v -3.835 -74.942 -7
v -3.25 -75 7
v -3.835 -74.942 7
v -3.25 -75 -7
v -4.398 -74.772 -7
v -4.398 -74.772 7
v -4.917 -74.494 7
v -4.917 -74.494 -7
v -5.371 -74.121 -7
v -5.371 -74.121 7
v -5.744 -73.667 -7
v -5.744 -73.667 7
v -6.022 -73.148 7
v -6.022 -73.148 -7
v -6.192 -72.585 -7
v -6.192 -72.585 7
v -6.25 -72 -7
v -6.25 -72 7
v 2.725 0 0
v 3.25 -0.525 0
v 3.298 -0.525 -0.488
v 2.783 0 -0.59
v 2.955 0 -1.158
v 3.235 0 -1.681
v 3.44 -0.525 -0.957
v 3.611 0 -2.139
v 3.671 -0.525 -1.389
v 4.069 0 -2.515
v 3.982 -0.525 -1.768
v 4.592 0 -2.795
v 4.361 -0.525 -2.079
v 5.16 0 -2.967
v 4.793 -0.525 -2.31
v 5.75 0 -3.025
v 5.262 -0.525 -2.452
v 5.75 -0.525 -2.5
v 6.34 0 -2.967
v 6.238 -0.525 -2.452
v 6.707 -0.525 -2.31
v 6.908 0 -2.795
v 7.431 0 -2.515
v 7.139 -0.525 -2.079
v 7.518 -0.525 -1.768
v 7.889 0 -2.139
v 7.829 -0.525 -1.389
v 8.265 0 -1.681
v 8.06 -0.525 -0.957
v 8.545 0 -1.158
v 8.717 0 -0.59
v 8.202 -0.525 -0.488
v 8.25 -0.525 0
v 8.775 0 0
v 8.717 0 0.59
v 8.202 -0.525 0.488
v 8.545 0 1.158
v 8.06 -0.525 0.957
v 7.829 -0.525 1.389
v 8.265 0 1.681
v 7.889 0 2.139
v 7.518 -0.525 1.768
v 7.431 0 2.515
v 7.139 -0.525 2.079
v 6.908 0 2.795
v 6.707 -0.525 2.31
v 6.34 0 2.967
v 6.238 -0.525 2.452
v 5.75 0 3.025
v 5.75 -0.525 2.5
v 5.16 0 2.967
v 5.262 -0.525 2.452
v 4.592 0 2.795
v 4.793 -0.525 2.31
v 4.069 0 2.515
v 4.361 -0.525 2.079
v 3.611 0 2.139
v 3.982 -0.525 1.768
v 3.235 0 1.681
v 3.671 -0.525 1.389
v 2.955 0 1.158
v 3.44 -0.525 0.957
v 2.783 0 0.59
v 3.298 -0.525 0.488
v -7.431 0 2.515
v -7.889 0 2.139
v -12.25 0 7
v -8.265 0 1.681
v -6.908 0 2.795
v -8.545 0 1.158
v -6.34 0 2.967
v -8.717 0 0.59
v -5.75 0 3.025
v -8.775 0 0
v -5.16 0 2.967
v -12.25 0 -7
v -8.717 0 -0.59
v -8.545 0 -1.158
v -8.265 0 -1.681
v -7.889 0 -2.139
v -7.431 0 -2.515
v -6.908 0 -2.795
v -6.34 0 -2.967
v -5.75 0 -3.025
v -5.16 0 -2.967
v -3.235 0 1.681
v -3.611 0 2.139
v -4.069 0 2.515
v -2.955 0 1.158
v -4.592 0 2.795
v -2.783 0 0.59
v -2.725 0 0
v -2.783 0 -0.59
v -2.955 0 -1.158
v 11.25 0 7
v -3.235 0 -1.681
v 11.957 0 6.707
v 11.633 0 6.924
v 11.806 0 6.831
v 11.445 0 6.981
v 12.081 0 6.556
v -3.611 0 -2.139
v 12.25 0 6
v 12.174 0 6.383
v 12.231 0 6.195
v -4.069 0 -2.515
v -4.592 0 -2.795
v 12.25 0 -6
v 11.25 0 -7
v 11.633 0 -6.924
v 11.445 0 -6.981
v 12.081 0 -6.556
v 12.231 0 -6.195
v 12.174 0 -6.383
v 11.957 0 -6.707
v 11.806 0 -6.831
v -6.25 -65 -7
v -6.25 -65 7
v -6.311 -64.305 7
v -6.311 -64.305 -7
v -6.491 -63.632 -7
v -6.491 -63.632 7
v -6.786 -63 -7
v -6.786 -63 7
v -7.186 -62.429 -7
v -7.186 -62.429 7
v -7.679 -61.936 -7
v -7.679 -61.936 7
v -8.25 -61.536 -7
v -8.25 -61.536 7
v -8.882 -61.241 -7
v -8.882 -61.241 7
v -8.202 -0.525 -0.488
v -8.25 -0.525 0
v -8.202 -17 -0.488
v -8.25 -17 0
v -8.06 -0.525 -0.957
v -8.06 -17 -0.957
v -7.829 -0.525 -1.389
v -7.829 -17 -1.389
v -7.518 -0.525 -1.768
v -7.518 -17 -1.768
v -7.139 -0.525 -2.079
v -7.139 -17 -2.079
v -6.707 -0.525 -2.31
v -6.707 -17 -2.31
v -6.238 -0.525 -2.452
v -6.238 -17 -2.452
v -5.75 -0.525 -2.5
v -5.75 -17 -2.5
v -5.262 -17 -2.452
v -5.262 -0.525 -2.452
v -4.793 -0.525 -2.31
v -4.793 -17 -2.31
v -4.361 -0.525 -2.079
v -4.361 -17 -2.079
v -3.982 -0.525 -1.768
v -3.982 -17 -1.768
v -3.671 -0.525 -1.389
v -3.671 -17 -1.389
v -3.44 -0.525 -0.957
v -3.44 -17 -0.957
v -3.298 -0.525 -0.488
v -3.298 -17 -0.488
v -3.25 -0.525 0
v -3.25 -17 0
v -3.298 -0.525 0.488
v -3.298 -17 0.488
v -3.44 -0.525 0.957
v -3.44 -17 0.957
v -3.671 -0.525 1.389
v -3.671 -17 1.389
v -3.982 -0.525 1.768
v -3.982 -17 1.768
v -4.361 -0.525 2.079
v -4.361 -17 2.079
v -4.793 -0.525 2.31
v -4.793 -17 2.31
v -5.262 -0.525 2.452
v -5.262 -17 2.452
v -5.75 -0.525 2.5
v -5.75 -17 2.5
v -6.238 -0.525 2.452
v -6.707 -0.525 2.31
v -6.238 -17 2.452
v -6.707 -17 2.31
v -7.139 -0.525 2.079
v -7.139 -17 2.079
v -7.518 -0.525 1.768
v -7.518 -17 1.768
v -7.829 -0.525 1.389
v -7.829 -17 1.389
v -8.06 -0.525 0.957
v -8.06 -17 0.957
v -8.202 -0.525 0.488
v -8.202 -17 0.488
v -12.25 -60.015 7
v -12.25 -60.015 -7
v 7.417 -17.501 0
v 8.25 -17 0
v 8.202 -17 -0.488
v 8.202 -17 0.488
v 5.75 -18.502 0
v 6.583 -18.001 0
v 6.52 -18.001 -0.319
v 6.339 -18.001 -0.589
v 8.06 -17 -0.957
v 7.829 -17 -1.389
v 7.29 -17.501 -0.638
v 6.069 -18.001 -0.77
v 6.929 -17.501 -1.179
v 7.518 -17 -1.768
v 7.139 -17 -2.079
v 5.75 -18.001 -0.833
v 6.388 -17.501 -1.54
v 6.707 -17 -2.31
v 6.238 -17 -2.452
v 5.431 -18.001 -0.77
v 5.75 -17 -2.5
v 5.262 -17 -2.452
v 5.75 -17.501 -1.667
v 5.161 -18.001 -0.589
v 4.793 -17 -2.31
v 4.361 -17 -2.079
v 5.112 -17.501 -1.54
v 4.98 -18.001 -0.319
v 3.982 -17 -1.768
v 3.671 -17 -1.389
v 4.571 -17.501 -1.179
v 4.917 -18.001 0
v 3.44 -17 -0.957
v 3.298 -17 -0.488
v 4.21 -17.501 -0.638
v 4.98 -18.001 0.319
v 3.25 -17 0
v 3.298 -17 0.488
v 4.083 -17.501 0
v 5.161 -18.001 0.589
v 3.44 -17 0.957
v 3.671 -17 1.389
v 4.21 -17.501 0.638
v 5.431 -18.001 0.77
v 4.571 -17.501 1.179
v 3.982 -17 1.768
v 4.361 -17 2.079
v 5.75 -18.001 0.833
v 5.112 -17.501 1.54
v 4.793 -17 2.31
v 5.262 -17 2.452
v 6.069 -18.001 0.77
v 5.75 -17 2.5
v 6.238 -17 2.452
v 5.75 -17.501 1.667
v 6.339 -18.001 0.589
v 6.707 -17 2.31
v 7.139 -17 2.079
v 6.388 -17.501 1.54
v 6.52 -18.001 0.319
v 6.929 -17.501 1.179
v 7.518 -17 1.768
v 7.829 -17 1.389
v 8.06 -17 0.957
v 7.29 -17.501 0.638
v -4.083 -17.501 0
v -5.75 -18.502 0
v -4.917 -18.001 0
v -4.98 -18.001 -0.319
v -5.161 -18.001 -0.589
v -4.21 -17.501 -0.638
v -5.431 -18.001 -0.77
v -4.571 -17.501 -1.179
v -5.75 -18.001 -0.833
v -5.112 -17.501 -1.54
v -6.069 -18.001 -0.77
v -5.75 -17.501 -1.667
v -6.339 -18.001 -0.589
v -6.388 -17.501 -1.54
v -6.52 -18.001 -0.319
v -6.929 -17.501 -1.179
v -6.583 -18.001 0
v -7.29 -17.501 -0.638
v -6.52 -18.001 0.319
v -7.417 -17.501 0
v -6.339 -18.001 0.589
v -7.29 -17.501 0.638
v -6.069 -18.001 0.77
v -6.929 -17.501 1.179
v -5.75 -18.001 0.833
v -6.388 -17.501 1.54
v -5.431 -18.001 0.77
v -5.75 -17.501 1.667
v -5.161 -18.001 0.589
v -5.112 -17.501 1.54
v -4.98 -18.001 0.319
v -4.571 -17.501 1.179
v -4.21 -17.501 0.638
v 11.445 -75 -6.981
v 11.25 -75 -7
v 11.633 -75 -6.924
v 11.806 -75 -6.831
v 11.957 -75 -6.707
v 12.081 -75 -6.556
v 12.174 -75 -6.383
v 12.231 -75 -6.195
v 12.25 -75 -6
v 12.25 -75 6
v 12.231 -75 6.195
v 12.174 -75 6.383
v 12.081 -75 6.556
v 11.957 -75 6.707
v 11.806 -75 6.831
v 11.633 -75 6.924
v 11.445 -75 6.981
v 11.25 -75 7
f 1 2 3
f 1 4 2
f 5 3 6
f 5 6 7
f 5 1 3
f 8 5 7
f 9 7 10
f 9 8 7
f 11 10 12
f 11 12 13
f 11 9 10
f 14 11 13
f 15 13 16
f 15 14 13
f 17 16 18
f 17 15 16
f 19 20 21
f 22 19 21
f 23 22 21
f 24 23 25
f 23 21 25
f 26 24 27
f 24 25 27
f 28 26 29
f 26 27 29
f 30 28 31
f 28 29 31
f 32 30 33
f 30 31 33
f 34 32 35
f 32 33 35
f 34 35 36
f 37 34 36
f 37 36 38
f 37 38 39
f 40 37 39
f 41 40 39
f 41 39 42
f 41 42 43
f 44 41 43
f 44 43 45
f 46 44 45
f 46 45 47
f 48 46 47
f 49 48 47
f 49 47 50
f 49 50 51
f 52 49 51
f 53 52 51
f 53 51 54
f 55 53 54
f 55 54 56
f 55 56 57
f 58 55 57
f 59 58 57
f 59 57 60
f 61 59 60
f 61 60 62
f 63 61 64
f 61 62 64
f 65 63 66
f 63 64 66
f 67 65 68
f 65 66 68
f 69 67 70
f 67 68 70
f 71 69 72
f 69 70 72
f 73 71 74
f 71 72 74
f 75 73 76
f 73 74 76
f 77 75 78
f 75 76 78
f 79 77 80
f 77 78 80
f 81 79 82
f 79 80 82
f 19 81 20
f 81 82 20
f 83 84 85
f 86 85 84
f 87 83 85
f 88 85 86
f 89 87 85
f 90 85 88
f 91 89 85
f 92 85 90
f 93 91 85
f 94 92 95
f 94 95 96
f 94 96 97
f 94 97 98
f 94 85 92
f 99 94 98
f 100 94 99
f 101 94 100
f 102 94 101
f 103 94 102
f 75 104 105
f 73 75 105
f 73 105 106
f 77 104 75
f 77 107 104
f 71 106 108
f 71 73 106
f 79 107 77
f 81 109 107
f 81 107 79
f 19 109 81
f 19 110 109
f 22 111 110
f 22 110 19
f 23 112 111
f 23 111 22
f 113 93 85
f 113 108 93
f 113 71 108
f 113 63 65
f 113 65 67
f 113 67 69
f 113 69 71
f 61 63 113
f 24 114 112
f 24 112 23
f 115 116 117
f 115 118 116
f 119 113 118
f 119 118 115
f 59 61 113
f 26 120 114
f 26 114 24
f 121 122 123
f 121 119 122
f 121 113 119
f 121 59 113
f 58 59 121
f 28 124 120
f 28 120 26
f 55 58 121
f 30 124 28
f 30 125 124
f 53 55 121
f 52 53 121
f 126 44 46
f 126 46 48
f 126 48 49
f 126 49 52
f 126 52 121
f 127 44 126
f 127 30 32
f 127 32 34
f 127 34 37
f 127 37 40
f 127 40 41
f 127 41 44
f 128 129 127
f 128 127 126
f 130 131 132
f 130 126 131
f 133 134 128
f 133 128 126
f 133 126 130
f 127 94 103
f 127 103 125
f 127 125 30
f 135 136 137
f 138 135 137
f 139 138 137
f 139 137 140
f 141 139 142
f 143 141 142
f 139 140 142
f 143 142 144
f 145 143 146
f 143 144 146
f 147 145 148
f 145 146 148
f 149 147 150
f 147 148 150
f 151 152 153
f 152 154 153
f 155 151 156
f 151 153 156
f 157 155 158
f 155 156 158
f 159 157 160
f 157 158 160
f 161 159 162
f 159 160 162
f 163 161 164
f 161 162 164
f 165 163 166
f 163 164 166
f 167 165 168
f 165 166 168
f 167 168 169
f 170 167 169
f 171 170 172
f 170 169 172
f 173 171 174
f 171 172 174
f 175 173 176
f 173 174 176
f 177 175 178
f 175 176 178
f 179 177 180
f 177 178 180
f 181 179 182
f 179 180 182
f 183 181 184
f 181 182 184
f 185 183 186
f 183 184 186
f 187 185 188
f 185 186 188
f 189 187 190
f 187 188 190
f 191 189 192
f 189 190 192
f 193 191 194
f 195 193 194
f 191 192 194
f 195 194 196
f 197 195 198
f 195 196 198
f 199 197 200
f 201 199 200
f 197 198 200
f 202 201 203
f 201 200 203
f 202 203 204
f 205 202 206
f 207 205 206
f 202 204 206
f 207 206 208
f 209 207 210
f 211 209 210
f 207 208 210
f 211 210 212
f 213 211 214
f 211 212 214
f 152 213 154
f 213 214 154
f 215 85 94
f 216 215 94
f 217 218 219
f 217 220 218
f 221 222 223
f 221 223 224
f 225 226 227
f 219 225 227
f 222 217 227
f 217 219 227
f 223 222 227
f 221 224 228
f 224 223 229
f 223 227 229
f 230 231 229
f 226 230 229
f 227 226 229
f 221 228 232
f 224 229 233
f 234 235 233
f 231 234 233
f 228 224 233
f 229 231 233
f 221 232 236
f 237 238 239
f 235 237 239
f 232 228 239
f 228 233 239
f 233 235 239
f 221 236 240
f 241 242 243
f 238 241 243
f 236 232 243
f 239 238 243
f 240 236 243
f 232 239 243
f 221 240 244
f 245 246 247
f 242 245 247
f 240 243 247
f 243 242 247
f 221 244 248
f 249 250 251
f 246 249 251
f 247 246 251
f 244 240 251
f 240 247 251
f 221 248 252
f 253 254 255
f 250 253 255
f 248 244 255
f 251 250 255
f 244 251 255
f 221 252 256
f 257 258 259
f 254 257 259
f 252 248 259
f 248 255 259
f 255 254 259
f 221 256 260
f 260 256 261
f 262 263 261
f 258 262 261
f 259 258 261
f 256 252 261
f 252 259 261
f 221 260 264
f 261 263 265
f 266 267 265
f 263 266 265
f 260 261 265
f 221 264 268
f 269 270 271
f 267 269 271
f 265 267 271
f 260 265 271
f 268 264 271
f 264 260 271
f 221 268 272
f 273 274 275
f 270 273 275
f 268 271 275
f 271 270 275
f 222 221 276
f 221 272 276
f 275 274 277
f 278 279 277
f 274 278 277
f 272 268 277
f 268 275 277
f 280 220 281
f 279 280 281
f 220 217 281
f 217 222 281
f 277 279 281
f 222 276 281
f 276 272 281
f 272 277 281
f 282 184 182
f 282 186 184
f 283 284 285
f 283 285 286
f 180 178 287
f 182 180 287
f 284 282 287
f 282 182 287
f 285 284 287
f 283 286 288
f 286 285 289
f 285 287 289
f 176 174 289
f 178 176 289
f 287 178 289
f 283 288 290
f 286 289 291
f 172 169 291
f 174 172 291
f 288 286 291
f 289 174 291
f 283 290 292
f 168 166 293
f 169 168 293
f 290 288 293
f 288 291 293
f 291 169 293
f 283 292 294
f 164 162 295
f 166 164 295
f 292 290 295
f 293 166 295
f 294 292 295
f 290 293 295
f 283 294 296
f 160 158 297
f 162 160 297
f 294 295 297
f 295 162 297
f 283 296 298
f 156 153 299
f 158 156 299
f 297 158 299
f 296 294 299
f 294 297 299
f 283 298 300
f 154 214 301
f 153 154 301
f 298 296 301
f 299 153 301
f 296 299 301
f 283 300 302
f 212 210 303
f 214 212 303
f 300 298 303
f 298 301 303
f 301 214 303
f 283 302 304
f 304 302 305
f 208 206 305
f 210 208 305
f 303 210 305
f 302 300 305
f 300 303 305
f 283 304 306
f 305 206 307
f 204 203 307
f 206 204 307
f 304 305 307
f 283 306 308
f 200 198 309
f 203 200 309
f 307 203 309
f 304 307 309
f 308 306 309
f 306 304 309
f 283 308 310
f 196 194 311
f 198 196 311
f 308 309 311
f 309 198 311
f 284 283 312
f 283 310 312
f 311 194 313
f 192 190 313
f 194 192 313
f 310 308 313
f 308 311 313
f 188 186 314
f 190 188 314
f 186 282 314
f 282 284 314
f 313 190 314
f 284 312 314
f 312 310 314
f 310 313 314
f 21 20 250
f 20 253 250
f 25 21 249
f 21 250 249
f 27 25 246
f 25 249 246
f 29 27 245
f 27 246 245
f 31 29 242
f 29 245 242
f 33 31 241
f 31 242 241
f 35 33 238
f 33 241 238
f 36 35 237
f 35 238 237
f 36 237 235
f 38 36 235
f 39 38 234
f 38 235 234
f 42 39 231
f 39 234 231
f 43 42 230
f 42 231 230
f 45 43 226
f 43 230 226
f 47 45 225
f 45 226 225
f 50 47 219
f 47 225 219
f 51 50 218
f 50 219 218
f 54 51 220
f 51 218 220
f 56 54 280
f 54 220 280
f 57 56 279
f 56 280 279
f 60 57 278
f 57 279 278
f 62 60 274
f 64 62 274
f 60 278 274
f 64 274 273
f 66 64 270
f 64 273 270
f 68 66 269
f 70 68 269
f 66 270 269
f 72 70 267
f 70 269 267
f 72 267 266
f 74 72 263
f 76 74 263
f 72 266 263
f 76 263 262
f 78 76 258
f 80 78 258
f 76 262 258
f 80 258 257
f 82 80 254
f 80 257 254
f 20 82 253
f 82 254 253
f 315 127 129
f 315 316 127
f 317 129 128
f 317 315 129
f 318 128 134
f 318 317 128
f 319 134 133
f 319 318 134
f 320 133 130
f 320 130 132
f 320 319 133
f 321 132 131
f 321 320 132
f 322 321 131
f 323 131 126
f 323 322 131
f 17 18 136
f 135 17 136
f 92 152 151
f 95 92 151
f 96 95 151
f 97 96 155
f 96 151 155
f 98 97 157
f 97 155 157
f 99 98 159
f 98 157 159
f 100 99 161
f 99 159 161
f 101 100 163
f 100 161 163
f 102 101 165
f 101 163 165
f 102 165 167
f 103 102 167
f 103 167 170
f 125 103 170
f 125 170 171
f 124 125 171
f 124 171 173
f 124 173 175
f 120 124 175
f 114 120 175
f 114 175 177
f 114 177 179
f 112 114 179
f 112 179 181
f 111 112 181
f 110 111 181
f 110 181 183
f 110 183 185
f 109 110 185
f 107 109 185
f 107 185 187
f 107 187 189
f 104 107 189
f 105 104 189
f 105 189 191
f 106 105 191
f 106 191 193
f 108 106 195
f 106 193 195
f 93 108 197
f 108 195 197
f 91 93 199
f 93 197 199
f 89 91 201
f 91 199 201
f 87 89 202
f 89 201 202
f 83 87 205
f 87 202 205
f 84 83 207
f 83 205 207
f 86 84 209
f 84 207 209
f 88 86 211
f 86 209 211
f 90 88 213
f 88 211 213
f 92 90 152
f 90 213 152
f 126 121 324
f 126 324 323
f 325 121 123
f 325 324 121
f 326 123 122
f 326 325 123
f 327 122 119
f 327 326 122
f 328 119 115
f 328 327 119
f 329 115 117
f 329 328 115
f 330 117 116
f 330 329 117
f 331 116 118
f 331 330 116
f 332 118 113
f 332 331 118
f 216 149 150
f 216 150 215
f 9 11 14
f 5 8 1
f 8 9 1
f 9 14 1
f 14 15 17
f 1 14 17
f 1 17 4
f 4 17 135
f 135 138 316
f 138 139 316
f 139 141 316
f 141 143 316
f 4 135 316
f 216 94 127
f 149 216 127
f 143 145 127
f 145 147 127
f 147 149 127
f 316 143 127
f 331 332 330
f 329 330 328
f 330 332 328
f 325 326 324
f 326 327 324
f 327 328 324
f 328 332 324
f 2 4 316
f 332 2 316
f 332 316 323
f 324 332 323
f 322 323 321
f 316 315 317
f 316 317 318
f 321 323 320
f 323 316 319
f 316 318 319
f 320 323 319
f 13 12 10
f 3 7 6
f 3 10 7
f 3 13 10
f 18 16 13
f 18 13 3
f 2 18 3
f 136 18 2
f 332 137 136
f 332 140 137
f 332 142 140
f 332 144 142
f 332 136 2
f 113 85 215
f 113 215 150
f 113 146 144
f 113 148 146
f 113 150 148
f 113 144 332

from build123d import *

# Parameters (mm, degrees)
SKETCH1_W                   = 24.5
SKETCH1_H                   = 14
BOSS_EXTRUDE1_DEPTH         = 75
CUT_EXTRUDE1_REACH          = 79.273
FILLET1_R                   = 3
FILLET2_R                   = 1
M6_TAPPED_HOLE1_D           = 5
M6_TAPPED_HOLE1_DEPTH       = 17
M6_TAPPED_HOLE1_CSINK_D     = 6.05
M6_TAPPED_HOLE1_CSINK_ANGLE = 90
M6_TAPPED_HOLE1_TIP         = 1.502151548


with BuildPart() as part:
    # Sketch1 → Boss-Extrude1 (new body)
    with BuildSketch(Plane(origin=(0, 0, 0), x_dir=(1, 0, 0), z_dir=(0, 1, 0))):
        Rectangle(SKETCH1_W, SKETCH1_H)
    extrude(amount=-BOSS_EXTRUDE1_DEPTH)

    # Sketch2 → Cut-Extrude1 (cut, up to next)
    with BuildSketch(Plane.XY.offset(7), mode=Mode.PRIVATE) as cut_extrude1_sk1:
        with BuildLine():
            Line((-8.881919427, -61.241229517), (-12.25, -60.015348442))
            Line((-12.25, -60.015348442), (-12.25, -75))
            Line((-12.25, -75), (-6.25, -75))
            Line((-6.25, -75), (-6.25, -65))
            ThreePointArc((-6.25, -65), (-6.973391823, -62.705694255), (-8.881919427, -61.241229517))
        make_face()
    cut_extrude1_tool1 = extrude(cut_extrude1_sk1.sketch, amount=-CUT_EXTRUDE1_REACH, mode=Mode.PRIVATE) & part.part
    add(cut_extrude1_tool1.solids().sort_by_distance((-9.372504, -68.134359, 7))[0], mode=Mode.SUBTRACT)

    # Fillet1
    fillet1_edges = [part.edges().sort_by_distance(p)[0] for p in [
        (-6.25, -75, 0),
    ]]
    fillet(fillet1_edges, radius=FILLET1_R)

    # Fillet2
    fillet2_edges = [part.edges().sort_by_distance(p)[0] for p in [
        (12.25, -37.5, 7),
        (12.25, -37.5, -7),
    ]]
    fillet(fillet2_edges, radius=FILLET2_R)

    # M6 Tapped Hole1
    with Locations(Plane(origin=(0, 0, 0), x_dir=(1, 0, 0), z_dir=(0, 1, 0))):
        with Locations((-5.75, 0), (5.75, 0)):
            CounterSinkHole(M6_TAPPED_HOLE1_D / 2, M6_TAPPED_HOLE1_CSINK_D / 2, depth=M6_TAPPED_HOLE1_DEPTH, counter_sink_angle=M6_TAPPED_HOLE1_CSINK_ANGLE)
            with Locations((0, 0, -(M6_TAPPED_HOLE1_DEPTH + M6_TAPPED_HOLE1_TIP / 2))):  # 118° drill point
                Cone(0, M6_TAPPED_HOLE1_D / 2, M6_TAPPED_HOLE1_TIP, mode=Mode.SUBTRACT)


solid = part.part
